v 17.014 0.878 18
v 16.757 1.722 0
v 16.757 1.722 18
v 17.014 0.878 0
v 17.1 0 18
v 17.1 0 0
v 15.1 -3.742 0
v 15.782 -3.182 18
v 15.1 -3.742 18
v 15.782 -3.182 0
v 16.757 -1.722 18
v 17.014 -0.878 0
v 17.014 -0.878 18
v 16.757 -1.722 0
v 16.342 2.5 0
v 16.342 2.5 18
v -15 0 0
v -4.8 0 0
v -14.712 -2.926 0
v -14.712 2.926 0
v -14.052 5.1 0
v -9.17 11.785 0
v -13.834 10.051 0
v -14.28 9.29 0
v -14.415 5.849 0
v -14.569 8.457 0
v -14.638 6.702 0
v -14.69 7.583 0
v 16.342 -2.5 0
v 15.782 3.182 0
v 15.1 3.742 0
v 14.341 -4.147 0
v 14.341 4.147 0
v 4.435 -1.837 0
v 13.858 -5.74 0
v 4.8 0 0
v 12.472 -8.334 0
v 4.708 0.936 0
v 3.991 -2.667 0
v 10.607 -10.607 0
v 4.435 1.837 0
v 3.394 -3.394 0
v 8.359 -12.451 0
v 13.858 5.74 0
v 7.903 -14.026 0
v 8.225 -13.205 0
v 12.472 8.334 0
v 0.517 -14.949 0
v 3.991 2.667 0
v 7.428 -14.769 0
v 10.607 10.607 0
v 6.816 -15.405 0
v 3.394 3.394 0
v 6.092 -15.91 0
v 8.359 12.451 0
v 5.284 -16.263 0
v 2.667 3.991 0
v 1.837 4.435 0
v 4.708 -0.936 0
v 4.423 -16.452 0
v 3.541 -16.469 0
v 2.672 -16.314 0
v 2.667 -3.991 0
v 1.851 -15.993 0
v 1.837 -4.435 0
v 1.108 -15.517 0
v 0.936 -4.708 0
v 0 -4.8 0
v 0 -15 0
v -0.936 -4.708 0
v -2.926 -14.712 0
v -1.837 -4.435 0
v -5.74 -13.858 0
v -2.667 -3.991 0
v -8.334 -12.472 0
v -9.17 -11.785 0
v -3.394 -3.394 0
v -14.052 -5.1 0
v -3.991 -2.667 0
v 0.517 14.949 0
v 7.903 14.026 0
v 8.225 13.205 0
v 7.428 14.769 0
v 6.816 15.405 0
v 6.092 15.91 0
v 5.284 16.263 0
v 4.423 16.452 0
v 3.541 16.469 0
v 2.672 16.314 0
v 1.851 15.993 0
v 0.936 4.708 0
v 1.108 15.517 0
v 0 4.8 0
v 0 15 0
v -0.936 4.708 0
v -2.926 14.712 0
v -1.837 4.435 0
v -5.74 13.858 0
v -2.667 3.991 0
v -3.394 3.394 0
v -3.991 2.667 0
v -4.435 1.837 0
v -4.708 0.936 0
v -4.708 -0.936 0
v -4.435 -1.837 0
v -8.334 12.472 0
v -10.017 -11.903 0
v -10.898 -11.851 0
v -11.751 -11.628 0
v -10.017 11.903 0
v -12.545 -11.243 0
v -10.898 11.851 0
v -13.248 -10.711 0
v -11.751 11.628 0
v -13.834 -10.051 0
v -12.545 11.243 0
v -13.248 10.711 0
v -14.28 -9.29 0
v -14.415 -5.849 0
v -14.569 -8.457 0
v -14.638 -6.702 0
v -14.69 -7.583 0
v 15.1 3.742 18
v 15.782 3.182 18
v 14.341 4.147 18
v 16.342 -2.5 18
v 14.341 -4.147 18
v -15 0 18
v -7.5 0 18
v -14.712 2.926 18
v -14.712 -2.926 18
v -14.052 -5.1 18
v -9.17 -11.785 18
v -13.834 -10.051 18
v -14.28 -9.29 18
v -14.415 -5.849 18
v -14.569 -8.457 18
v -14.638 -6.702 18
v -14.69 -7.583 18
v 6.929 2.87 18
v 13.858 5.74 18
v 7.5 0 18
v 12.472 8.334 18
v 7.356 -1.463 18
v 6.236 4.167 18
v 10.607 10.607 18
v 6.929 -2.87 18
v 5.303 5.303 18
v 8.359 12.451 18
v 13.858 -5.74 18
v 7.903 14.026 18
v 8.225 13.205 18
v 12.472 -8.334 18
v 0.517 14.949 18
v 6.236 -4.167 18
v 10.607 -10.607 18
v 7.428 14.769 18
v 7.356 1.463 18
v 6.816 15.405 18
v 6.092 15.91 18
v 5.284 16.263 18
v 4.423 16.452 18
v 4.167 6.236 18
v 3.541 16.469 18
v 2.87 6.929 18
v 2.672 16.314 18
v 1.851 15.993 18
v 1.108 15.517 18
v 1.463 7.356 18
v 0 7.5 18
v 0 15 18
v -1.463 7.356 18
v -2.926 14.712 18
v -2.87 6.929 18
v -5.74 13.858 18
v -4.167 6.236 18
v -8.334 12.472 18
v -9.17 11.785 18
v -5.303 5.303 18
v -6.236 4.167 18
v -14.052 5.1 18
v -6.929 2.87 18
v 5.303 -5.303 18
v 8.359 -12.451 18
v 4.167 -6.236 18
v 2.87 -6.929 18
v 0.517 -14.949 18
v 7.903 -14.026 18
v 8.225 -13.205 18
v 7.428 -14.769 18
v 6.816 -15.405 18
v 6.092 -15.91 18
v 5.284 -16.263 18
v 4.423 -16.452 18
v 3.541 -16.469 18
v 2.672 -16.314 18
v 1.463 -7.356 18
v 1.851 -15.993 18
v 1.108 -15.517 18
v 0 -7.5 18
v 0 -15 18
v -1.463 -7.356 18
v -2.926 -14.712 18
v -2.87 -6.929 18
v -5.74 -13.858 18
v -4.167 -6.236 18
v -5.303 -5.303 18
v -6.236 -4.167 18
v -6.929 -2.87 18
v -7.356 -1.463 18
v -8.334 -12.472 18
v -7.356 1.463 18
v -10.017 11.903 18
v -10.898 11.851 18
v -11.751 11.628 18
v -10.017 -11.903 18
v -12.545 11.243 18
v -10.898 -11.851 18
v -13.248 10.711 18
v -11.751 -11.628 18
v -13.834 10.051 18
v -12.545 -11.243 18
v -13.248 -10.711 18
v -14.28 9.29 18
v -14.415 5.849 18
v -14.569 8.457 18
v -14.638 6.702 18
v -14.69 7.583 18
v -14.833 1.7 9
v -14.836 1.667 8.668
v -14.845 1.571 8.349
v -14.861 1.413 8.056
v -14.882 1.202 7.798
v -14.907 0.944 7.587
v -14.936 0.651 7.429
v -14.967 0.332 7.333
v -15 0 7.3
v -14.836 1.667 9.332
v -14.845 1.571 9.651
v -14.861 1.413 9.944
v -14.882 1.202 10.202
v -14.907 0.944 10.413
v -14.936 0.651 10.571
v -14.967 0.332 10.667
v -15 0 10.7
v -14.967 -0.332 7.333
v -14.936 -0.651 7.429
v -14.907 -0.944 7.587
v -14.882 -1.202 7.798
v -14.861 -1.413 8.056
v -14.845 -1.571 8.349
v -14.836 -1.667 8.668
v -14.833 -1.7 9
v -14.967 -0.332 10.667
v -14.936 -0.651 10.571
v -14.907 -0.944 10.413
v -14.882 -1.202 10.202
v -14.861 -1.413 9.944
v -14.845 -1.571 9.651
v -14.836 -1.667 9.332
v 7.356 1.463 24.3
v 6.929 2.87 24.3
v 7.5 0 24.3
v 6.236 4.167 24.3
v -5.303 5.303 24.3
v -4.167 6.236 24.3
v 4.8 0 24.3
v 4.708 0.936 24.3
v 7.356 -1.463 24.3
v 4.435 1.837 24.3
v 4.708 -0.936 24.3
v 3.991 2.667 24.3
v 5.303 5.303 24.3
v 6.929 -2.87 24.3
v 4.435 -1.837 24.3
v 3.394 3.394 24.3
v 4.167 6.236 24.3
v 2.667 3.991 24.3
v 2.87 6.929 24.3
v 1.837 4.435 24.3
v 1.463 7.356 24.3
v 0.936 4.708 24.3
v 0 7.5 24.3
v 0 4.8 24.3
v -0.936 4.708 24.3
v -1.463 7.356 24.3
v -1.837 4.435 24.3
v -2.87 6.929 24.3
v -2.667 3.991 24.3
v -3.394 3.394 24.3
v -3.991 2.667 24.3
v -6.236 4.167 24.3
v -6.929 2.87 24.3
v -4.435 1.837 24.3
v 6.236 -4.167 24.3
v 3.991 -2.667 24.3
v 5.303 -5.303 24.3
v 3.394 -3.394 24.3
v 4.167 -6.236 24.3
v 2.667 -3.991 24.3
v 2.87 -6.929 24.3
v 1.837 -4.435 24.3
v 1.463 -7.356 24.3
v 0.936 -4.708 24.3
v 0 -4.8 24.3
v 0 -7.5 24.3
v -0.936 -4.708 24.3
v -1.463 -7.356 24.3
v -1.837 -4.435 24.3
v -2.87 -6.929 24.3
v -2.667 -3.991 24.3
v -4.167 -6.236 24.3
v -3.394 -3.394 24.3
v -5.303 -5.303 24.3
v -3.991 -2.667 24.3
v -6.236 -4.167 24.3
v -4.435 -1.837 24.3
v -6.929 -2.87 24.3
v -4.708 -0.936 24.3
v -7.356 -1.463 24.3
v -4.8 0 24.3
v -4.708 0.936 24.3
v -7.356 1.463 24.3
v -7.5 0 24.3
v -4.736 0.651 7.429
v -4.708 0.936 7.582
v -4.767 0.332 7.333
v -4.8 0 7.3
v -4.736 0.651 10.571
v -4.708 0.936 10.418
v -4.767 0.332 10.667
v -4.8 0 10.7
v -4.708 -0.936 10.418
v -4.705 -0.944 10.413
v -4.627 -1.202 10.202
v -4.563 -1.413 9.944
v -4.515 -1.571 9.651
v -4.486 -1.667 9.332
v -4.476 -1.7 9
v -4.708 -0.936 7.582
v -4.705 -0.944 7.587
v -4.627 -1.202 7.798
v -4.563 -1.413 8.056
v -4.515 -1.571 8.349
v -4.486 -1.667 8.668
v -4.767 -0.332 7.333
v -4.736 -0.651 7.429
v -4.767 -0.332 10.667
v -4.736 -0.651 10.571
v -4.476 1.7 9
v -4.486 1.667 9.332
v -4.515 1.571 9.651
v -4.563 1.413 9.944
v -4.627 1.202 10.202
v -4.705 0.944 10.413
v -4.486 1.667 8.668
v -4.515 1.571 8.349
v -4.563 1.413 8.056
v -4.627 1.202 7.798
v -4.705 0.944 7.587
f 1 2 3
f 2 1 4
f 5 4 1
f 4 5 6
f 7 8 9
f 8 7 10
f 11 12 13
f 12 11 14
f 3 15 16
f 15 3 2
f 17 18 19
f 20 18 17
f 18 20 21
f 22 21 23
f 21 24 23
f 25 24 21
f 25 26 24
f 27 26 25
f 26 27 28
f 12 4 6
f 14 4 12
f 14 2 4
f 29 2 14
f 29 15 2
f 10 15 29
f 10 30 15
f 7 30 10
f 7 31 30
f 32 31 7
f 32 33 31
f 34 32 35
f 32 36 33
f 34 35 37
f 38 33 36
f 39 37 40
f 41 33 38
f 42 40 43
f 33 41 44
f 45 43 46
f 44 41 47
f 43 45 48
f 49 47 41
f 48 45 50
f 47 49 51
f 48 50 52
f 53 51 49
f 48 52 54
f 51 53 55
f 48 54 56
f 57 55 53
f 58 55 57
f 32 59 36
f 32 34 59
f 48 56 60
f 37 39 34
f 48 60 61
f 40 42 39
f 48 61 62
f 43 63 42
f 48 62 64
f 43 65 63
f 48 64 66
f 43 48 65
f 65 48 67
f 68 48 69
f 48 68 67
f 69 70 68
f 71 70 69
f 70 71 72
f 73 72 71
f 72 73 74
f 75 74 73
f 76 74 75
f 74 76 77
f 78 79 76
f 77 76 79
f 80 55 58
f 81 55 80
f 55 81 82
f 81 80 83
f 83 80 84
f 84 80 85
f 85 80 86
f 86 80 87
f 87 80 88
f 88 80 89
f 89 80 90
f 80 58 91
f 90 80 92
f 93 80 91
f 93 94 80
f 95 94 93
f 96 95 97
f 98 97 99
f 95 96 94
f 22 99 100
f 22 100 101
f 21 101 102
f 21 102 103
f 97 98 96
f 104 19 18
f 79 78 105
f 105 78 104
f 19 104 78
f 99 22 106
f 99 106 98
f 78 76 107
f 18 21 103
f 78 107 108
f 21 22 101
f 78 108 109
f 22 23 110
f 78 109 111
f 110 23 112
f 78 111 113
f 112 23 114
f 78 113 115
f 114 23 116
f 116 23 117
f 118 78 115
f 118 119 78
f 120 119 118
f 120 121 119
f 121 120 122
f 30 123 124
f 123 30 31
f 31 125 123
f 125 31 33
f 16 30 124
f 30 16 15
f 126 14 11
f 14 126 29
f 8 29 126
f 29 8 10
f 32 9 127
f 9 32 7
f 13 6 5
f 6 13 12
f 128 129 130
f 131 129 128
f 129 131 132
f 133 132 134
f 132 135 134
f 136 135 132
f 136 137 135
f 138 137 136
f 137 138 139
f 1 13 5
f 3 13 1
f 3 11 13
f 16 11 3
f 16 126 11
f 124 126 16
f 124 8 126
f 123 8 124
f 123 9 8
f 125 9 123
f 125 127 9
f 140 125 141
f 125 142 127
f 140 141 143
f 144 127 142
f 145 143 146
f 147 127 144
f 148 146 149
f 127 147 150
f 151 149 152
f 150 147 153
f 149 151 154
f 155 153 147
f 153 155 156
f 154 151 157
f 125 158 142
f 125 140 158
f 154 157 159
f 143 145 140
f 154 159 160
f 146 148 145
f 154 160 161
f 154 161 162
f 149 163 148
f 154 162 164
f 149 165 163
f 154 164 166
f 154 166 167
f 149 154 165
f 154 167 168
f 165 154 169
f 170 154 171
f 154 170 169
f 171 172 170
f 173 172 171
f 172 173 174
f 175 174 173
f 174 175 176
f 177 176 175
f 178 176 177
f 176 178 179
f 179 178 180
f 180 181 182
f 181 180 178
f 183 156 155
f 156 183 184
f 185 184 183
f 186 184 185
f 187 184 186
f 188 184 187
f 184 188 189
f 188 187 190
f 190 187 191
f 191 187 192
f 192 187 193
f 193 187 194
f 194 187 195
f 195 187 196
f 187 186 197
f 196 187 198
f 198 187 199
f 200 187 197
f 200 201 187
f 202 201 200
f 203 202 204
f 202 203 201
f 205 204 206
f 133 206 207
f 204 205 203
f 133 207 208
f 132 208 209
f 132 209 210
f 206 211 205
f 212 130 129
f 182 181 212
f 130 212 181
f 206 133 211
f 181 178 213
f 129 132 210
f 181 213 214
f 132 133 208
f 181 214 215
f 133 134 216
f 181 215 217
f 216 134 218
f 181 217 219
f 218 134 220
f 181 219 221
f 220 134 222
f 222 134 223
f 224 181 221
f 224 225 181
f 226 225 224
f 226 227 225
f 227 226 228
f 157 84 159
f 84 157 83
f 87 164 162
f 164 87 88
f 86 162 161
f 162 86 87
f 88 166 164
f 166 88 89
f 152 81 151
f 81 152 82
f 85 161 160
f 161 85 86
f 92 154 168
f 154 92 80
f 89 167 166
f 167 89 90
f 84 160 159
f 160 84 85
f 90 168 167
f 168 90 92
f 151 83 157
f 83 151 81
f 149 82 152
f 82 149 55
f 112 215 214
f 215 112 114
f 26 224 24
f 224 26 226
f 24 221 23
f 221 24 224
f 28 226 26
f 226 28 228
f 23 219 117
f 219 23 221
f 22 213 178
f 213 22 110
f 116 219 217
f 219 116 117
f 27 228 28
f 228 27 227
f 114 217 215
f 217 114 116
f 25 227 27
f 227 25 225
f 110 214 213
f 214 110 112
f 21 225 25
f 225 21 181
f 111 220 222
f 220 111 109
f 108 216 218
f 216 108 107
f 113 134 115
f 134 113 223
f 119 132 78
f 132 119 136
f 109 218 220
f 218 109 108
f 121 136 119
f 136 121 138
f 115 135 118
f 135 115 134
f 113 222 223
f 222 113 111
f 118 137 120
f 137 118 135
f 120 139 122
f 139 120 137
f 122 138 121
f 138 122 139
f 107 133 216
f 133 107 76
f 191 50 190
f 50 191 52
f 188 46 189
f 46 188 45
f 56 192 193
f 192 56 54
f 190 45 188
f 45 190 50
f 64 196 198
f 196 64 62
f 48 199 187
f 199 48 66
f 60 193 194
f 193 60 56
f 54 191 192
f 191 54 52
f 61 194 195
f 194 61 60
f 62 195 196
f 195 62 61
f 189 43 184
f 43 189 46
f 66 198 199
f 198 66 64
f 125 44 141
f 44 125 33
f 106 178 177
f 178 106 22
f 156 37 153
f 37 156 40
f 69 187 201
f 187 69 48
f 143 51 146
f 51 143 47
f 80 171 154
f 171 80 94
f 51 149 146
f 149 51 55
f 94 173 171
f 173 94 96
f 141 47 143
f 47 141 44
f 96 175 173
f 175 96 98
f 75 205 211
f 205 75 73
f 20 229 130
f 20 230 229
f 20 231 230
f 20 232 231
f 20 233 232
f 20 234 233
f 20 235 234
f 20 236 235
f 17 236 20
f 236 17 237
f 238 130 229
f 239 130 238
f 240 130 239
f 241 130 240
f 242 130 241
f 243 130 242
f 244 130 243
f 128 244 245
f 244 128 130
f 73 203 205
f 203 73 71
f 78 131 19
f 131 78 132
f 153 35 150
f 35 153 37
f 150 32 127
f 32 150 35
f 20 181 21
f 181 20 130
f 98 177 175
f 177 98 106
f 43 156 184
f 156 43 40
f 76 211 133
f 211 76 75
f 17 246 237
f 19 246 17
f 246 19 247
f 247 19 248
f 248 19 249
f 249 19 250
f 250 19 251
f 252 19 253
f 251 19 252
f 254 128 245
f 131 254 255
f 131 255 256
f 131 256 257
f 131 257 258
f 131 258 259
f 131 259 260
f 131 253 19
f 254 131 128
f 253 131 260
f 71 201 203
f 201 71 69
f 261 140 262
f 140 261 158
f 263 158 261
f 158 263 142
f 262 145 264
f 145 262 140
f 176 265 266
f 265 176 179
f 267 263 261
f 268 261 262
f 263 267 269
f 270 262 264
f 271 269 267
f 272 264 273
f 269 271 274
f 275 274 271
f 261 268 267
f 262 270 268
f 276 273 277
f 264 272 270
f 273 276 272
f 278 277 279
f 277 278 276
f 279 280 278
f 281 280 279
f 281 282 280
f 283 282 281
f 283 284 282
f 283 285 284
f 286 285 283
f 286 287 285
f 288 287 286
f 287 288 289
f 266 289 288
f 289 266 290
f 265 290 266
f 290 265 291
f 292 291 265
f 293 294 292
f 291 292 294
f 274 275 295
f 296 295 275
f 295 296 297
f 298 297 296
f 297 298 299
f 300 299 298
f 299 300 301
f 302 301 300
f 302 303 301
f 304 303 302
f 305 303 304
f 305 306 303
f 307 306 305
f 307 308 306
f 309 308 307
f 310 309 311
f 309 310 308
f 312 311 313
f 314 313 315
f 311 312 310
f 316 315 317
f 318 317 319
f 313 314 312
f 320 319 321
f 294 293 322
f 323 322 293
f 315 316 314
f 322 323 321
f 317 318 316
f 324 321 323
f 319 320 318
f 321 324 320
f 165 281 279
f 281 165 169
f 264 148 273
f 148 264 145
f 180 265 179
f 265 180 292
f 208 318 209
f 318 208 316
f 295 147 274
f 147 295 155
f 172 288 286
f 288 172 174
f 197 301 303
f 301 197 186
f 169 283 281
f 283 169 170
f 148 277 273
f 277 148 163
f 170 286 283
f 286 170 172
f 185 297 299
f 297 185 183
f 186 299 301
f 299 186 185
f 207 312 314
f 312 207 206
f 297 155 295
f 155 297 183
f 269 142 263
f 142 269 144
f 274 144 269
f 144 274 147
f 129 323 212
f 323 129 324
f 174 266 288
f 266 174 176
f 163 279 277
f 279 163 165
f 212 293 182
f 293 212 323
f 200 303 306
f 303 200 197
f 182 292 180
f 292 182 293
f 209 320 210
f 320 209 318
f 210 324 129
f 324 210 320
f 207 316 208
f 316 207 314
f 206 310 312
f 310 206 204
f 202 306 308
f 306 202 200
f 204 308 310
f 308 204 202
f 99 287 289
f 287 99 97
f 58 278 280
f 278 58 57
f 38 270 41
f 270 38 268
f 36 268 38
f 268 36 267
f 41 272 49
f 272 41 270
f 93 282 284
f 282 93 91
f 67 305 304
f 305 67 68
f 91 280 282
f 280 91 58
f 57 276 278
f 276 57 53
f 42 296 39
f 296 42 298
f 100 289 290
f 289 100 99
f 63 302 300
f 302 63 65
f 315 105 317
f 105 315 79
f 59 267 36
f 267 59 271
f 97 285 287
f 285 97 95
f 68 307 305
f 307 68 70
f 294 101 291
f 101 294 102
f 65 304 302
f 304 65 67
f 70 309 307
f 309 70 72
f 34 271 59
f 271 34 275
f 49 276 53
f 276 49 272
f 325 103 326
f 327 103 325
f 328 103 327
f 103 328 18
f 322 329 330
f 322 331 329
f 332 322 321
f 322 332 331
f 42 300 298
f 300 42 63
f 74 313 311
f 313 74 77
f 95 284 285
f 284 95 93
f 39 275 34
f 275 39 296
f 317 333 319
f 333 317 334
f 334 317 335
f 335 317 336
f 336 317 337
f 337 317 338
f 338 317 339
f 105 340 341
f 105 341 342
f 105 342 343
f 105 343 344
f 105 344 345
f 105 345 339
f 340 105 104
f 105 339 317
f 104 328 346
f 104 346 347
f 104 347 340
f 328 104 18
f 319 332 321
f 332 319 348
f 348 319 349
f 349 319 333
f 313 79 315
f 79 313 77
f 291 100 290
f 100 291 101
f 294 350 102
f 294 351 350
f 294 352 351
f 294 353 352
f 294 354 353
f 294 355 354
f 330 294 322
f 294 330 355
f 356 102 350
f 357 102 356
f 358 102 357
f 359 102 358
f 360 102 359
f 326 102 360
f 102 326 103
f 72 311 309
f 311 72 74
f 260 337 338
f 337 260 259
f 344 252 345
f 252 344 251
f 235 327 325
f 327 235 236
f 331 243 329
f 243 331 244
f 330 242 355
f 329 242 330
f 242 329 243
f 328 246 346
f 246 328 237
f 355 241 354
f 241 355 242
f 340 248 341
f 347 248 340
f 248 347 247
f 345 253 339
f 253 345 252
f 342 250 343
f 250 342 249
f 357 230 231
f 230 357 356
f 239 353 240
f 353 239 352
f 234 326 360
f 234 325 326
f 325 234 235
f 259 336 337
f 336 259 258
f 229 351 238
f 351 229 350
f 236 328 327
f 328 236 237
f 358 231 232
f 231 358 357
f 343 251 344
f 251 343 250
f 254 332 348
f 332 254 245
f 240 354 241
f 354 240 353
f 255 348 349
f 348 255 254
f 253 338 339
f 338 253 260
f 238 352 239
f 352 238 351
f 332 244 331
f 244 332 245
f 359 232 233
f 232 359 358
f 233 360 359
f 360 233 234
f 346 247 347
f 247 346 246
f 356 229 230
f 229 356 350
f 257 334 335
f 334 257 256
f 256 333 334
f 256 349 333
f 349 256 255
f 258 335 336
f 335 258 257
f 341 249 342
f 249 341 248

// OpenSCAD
$fn = 32;

// ----------------------------------------------------------------------
// Hand knob: 30 x 30 x 24.3 mm
// ----------------------------------------------------------------------

// --- parameters (mm) ---
knob_d = 30;              // knob diameter
knob_h = 18;              // knob height
bore_d = 9.6;             // shaft bore
set_d = 3.4;              // set screw tap hole
knurl_d = 0.88;           // knurl groove diameter
lobes = 5;                // grip lobes
cap_h = 6.3;              // raised centre cap
cap_d = 15;               // centre cap diameter

module body() {
  cylinder(h = knob_h, d = knob_d);
  for (i = [0 : lobes - 1])
    rotate([0, 0, i * 360 / lobes])
      translate([knob_d * 0.42, 0, 0])
        cylinder(h = knob_h, d = knob_d * 0.3);
}

module cap() {
  translate([0, 0, knob_h - 1]) cylinder(h = cap_h + 1, d = cap_d);
}

difference() {
  union() {
    body();
    cap();
  }
  translate([0, 0, -1]) cylinder(h = knob_h + cap_h + 2, d = bore_d);
  translate([-knob_d / 2 - 1, 0, knob_h * 0.5]) rotate([0, 90, 0]) cylinder(h = knob_d / 2 + 2, d = set_d);
}
